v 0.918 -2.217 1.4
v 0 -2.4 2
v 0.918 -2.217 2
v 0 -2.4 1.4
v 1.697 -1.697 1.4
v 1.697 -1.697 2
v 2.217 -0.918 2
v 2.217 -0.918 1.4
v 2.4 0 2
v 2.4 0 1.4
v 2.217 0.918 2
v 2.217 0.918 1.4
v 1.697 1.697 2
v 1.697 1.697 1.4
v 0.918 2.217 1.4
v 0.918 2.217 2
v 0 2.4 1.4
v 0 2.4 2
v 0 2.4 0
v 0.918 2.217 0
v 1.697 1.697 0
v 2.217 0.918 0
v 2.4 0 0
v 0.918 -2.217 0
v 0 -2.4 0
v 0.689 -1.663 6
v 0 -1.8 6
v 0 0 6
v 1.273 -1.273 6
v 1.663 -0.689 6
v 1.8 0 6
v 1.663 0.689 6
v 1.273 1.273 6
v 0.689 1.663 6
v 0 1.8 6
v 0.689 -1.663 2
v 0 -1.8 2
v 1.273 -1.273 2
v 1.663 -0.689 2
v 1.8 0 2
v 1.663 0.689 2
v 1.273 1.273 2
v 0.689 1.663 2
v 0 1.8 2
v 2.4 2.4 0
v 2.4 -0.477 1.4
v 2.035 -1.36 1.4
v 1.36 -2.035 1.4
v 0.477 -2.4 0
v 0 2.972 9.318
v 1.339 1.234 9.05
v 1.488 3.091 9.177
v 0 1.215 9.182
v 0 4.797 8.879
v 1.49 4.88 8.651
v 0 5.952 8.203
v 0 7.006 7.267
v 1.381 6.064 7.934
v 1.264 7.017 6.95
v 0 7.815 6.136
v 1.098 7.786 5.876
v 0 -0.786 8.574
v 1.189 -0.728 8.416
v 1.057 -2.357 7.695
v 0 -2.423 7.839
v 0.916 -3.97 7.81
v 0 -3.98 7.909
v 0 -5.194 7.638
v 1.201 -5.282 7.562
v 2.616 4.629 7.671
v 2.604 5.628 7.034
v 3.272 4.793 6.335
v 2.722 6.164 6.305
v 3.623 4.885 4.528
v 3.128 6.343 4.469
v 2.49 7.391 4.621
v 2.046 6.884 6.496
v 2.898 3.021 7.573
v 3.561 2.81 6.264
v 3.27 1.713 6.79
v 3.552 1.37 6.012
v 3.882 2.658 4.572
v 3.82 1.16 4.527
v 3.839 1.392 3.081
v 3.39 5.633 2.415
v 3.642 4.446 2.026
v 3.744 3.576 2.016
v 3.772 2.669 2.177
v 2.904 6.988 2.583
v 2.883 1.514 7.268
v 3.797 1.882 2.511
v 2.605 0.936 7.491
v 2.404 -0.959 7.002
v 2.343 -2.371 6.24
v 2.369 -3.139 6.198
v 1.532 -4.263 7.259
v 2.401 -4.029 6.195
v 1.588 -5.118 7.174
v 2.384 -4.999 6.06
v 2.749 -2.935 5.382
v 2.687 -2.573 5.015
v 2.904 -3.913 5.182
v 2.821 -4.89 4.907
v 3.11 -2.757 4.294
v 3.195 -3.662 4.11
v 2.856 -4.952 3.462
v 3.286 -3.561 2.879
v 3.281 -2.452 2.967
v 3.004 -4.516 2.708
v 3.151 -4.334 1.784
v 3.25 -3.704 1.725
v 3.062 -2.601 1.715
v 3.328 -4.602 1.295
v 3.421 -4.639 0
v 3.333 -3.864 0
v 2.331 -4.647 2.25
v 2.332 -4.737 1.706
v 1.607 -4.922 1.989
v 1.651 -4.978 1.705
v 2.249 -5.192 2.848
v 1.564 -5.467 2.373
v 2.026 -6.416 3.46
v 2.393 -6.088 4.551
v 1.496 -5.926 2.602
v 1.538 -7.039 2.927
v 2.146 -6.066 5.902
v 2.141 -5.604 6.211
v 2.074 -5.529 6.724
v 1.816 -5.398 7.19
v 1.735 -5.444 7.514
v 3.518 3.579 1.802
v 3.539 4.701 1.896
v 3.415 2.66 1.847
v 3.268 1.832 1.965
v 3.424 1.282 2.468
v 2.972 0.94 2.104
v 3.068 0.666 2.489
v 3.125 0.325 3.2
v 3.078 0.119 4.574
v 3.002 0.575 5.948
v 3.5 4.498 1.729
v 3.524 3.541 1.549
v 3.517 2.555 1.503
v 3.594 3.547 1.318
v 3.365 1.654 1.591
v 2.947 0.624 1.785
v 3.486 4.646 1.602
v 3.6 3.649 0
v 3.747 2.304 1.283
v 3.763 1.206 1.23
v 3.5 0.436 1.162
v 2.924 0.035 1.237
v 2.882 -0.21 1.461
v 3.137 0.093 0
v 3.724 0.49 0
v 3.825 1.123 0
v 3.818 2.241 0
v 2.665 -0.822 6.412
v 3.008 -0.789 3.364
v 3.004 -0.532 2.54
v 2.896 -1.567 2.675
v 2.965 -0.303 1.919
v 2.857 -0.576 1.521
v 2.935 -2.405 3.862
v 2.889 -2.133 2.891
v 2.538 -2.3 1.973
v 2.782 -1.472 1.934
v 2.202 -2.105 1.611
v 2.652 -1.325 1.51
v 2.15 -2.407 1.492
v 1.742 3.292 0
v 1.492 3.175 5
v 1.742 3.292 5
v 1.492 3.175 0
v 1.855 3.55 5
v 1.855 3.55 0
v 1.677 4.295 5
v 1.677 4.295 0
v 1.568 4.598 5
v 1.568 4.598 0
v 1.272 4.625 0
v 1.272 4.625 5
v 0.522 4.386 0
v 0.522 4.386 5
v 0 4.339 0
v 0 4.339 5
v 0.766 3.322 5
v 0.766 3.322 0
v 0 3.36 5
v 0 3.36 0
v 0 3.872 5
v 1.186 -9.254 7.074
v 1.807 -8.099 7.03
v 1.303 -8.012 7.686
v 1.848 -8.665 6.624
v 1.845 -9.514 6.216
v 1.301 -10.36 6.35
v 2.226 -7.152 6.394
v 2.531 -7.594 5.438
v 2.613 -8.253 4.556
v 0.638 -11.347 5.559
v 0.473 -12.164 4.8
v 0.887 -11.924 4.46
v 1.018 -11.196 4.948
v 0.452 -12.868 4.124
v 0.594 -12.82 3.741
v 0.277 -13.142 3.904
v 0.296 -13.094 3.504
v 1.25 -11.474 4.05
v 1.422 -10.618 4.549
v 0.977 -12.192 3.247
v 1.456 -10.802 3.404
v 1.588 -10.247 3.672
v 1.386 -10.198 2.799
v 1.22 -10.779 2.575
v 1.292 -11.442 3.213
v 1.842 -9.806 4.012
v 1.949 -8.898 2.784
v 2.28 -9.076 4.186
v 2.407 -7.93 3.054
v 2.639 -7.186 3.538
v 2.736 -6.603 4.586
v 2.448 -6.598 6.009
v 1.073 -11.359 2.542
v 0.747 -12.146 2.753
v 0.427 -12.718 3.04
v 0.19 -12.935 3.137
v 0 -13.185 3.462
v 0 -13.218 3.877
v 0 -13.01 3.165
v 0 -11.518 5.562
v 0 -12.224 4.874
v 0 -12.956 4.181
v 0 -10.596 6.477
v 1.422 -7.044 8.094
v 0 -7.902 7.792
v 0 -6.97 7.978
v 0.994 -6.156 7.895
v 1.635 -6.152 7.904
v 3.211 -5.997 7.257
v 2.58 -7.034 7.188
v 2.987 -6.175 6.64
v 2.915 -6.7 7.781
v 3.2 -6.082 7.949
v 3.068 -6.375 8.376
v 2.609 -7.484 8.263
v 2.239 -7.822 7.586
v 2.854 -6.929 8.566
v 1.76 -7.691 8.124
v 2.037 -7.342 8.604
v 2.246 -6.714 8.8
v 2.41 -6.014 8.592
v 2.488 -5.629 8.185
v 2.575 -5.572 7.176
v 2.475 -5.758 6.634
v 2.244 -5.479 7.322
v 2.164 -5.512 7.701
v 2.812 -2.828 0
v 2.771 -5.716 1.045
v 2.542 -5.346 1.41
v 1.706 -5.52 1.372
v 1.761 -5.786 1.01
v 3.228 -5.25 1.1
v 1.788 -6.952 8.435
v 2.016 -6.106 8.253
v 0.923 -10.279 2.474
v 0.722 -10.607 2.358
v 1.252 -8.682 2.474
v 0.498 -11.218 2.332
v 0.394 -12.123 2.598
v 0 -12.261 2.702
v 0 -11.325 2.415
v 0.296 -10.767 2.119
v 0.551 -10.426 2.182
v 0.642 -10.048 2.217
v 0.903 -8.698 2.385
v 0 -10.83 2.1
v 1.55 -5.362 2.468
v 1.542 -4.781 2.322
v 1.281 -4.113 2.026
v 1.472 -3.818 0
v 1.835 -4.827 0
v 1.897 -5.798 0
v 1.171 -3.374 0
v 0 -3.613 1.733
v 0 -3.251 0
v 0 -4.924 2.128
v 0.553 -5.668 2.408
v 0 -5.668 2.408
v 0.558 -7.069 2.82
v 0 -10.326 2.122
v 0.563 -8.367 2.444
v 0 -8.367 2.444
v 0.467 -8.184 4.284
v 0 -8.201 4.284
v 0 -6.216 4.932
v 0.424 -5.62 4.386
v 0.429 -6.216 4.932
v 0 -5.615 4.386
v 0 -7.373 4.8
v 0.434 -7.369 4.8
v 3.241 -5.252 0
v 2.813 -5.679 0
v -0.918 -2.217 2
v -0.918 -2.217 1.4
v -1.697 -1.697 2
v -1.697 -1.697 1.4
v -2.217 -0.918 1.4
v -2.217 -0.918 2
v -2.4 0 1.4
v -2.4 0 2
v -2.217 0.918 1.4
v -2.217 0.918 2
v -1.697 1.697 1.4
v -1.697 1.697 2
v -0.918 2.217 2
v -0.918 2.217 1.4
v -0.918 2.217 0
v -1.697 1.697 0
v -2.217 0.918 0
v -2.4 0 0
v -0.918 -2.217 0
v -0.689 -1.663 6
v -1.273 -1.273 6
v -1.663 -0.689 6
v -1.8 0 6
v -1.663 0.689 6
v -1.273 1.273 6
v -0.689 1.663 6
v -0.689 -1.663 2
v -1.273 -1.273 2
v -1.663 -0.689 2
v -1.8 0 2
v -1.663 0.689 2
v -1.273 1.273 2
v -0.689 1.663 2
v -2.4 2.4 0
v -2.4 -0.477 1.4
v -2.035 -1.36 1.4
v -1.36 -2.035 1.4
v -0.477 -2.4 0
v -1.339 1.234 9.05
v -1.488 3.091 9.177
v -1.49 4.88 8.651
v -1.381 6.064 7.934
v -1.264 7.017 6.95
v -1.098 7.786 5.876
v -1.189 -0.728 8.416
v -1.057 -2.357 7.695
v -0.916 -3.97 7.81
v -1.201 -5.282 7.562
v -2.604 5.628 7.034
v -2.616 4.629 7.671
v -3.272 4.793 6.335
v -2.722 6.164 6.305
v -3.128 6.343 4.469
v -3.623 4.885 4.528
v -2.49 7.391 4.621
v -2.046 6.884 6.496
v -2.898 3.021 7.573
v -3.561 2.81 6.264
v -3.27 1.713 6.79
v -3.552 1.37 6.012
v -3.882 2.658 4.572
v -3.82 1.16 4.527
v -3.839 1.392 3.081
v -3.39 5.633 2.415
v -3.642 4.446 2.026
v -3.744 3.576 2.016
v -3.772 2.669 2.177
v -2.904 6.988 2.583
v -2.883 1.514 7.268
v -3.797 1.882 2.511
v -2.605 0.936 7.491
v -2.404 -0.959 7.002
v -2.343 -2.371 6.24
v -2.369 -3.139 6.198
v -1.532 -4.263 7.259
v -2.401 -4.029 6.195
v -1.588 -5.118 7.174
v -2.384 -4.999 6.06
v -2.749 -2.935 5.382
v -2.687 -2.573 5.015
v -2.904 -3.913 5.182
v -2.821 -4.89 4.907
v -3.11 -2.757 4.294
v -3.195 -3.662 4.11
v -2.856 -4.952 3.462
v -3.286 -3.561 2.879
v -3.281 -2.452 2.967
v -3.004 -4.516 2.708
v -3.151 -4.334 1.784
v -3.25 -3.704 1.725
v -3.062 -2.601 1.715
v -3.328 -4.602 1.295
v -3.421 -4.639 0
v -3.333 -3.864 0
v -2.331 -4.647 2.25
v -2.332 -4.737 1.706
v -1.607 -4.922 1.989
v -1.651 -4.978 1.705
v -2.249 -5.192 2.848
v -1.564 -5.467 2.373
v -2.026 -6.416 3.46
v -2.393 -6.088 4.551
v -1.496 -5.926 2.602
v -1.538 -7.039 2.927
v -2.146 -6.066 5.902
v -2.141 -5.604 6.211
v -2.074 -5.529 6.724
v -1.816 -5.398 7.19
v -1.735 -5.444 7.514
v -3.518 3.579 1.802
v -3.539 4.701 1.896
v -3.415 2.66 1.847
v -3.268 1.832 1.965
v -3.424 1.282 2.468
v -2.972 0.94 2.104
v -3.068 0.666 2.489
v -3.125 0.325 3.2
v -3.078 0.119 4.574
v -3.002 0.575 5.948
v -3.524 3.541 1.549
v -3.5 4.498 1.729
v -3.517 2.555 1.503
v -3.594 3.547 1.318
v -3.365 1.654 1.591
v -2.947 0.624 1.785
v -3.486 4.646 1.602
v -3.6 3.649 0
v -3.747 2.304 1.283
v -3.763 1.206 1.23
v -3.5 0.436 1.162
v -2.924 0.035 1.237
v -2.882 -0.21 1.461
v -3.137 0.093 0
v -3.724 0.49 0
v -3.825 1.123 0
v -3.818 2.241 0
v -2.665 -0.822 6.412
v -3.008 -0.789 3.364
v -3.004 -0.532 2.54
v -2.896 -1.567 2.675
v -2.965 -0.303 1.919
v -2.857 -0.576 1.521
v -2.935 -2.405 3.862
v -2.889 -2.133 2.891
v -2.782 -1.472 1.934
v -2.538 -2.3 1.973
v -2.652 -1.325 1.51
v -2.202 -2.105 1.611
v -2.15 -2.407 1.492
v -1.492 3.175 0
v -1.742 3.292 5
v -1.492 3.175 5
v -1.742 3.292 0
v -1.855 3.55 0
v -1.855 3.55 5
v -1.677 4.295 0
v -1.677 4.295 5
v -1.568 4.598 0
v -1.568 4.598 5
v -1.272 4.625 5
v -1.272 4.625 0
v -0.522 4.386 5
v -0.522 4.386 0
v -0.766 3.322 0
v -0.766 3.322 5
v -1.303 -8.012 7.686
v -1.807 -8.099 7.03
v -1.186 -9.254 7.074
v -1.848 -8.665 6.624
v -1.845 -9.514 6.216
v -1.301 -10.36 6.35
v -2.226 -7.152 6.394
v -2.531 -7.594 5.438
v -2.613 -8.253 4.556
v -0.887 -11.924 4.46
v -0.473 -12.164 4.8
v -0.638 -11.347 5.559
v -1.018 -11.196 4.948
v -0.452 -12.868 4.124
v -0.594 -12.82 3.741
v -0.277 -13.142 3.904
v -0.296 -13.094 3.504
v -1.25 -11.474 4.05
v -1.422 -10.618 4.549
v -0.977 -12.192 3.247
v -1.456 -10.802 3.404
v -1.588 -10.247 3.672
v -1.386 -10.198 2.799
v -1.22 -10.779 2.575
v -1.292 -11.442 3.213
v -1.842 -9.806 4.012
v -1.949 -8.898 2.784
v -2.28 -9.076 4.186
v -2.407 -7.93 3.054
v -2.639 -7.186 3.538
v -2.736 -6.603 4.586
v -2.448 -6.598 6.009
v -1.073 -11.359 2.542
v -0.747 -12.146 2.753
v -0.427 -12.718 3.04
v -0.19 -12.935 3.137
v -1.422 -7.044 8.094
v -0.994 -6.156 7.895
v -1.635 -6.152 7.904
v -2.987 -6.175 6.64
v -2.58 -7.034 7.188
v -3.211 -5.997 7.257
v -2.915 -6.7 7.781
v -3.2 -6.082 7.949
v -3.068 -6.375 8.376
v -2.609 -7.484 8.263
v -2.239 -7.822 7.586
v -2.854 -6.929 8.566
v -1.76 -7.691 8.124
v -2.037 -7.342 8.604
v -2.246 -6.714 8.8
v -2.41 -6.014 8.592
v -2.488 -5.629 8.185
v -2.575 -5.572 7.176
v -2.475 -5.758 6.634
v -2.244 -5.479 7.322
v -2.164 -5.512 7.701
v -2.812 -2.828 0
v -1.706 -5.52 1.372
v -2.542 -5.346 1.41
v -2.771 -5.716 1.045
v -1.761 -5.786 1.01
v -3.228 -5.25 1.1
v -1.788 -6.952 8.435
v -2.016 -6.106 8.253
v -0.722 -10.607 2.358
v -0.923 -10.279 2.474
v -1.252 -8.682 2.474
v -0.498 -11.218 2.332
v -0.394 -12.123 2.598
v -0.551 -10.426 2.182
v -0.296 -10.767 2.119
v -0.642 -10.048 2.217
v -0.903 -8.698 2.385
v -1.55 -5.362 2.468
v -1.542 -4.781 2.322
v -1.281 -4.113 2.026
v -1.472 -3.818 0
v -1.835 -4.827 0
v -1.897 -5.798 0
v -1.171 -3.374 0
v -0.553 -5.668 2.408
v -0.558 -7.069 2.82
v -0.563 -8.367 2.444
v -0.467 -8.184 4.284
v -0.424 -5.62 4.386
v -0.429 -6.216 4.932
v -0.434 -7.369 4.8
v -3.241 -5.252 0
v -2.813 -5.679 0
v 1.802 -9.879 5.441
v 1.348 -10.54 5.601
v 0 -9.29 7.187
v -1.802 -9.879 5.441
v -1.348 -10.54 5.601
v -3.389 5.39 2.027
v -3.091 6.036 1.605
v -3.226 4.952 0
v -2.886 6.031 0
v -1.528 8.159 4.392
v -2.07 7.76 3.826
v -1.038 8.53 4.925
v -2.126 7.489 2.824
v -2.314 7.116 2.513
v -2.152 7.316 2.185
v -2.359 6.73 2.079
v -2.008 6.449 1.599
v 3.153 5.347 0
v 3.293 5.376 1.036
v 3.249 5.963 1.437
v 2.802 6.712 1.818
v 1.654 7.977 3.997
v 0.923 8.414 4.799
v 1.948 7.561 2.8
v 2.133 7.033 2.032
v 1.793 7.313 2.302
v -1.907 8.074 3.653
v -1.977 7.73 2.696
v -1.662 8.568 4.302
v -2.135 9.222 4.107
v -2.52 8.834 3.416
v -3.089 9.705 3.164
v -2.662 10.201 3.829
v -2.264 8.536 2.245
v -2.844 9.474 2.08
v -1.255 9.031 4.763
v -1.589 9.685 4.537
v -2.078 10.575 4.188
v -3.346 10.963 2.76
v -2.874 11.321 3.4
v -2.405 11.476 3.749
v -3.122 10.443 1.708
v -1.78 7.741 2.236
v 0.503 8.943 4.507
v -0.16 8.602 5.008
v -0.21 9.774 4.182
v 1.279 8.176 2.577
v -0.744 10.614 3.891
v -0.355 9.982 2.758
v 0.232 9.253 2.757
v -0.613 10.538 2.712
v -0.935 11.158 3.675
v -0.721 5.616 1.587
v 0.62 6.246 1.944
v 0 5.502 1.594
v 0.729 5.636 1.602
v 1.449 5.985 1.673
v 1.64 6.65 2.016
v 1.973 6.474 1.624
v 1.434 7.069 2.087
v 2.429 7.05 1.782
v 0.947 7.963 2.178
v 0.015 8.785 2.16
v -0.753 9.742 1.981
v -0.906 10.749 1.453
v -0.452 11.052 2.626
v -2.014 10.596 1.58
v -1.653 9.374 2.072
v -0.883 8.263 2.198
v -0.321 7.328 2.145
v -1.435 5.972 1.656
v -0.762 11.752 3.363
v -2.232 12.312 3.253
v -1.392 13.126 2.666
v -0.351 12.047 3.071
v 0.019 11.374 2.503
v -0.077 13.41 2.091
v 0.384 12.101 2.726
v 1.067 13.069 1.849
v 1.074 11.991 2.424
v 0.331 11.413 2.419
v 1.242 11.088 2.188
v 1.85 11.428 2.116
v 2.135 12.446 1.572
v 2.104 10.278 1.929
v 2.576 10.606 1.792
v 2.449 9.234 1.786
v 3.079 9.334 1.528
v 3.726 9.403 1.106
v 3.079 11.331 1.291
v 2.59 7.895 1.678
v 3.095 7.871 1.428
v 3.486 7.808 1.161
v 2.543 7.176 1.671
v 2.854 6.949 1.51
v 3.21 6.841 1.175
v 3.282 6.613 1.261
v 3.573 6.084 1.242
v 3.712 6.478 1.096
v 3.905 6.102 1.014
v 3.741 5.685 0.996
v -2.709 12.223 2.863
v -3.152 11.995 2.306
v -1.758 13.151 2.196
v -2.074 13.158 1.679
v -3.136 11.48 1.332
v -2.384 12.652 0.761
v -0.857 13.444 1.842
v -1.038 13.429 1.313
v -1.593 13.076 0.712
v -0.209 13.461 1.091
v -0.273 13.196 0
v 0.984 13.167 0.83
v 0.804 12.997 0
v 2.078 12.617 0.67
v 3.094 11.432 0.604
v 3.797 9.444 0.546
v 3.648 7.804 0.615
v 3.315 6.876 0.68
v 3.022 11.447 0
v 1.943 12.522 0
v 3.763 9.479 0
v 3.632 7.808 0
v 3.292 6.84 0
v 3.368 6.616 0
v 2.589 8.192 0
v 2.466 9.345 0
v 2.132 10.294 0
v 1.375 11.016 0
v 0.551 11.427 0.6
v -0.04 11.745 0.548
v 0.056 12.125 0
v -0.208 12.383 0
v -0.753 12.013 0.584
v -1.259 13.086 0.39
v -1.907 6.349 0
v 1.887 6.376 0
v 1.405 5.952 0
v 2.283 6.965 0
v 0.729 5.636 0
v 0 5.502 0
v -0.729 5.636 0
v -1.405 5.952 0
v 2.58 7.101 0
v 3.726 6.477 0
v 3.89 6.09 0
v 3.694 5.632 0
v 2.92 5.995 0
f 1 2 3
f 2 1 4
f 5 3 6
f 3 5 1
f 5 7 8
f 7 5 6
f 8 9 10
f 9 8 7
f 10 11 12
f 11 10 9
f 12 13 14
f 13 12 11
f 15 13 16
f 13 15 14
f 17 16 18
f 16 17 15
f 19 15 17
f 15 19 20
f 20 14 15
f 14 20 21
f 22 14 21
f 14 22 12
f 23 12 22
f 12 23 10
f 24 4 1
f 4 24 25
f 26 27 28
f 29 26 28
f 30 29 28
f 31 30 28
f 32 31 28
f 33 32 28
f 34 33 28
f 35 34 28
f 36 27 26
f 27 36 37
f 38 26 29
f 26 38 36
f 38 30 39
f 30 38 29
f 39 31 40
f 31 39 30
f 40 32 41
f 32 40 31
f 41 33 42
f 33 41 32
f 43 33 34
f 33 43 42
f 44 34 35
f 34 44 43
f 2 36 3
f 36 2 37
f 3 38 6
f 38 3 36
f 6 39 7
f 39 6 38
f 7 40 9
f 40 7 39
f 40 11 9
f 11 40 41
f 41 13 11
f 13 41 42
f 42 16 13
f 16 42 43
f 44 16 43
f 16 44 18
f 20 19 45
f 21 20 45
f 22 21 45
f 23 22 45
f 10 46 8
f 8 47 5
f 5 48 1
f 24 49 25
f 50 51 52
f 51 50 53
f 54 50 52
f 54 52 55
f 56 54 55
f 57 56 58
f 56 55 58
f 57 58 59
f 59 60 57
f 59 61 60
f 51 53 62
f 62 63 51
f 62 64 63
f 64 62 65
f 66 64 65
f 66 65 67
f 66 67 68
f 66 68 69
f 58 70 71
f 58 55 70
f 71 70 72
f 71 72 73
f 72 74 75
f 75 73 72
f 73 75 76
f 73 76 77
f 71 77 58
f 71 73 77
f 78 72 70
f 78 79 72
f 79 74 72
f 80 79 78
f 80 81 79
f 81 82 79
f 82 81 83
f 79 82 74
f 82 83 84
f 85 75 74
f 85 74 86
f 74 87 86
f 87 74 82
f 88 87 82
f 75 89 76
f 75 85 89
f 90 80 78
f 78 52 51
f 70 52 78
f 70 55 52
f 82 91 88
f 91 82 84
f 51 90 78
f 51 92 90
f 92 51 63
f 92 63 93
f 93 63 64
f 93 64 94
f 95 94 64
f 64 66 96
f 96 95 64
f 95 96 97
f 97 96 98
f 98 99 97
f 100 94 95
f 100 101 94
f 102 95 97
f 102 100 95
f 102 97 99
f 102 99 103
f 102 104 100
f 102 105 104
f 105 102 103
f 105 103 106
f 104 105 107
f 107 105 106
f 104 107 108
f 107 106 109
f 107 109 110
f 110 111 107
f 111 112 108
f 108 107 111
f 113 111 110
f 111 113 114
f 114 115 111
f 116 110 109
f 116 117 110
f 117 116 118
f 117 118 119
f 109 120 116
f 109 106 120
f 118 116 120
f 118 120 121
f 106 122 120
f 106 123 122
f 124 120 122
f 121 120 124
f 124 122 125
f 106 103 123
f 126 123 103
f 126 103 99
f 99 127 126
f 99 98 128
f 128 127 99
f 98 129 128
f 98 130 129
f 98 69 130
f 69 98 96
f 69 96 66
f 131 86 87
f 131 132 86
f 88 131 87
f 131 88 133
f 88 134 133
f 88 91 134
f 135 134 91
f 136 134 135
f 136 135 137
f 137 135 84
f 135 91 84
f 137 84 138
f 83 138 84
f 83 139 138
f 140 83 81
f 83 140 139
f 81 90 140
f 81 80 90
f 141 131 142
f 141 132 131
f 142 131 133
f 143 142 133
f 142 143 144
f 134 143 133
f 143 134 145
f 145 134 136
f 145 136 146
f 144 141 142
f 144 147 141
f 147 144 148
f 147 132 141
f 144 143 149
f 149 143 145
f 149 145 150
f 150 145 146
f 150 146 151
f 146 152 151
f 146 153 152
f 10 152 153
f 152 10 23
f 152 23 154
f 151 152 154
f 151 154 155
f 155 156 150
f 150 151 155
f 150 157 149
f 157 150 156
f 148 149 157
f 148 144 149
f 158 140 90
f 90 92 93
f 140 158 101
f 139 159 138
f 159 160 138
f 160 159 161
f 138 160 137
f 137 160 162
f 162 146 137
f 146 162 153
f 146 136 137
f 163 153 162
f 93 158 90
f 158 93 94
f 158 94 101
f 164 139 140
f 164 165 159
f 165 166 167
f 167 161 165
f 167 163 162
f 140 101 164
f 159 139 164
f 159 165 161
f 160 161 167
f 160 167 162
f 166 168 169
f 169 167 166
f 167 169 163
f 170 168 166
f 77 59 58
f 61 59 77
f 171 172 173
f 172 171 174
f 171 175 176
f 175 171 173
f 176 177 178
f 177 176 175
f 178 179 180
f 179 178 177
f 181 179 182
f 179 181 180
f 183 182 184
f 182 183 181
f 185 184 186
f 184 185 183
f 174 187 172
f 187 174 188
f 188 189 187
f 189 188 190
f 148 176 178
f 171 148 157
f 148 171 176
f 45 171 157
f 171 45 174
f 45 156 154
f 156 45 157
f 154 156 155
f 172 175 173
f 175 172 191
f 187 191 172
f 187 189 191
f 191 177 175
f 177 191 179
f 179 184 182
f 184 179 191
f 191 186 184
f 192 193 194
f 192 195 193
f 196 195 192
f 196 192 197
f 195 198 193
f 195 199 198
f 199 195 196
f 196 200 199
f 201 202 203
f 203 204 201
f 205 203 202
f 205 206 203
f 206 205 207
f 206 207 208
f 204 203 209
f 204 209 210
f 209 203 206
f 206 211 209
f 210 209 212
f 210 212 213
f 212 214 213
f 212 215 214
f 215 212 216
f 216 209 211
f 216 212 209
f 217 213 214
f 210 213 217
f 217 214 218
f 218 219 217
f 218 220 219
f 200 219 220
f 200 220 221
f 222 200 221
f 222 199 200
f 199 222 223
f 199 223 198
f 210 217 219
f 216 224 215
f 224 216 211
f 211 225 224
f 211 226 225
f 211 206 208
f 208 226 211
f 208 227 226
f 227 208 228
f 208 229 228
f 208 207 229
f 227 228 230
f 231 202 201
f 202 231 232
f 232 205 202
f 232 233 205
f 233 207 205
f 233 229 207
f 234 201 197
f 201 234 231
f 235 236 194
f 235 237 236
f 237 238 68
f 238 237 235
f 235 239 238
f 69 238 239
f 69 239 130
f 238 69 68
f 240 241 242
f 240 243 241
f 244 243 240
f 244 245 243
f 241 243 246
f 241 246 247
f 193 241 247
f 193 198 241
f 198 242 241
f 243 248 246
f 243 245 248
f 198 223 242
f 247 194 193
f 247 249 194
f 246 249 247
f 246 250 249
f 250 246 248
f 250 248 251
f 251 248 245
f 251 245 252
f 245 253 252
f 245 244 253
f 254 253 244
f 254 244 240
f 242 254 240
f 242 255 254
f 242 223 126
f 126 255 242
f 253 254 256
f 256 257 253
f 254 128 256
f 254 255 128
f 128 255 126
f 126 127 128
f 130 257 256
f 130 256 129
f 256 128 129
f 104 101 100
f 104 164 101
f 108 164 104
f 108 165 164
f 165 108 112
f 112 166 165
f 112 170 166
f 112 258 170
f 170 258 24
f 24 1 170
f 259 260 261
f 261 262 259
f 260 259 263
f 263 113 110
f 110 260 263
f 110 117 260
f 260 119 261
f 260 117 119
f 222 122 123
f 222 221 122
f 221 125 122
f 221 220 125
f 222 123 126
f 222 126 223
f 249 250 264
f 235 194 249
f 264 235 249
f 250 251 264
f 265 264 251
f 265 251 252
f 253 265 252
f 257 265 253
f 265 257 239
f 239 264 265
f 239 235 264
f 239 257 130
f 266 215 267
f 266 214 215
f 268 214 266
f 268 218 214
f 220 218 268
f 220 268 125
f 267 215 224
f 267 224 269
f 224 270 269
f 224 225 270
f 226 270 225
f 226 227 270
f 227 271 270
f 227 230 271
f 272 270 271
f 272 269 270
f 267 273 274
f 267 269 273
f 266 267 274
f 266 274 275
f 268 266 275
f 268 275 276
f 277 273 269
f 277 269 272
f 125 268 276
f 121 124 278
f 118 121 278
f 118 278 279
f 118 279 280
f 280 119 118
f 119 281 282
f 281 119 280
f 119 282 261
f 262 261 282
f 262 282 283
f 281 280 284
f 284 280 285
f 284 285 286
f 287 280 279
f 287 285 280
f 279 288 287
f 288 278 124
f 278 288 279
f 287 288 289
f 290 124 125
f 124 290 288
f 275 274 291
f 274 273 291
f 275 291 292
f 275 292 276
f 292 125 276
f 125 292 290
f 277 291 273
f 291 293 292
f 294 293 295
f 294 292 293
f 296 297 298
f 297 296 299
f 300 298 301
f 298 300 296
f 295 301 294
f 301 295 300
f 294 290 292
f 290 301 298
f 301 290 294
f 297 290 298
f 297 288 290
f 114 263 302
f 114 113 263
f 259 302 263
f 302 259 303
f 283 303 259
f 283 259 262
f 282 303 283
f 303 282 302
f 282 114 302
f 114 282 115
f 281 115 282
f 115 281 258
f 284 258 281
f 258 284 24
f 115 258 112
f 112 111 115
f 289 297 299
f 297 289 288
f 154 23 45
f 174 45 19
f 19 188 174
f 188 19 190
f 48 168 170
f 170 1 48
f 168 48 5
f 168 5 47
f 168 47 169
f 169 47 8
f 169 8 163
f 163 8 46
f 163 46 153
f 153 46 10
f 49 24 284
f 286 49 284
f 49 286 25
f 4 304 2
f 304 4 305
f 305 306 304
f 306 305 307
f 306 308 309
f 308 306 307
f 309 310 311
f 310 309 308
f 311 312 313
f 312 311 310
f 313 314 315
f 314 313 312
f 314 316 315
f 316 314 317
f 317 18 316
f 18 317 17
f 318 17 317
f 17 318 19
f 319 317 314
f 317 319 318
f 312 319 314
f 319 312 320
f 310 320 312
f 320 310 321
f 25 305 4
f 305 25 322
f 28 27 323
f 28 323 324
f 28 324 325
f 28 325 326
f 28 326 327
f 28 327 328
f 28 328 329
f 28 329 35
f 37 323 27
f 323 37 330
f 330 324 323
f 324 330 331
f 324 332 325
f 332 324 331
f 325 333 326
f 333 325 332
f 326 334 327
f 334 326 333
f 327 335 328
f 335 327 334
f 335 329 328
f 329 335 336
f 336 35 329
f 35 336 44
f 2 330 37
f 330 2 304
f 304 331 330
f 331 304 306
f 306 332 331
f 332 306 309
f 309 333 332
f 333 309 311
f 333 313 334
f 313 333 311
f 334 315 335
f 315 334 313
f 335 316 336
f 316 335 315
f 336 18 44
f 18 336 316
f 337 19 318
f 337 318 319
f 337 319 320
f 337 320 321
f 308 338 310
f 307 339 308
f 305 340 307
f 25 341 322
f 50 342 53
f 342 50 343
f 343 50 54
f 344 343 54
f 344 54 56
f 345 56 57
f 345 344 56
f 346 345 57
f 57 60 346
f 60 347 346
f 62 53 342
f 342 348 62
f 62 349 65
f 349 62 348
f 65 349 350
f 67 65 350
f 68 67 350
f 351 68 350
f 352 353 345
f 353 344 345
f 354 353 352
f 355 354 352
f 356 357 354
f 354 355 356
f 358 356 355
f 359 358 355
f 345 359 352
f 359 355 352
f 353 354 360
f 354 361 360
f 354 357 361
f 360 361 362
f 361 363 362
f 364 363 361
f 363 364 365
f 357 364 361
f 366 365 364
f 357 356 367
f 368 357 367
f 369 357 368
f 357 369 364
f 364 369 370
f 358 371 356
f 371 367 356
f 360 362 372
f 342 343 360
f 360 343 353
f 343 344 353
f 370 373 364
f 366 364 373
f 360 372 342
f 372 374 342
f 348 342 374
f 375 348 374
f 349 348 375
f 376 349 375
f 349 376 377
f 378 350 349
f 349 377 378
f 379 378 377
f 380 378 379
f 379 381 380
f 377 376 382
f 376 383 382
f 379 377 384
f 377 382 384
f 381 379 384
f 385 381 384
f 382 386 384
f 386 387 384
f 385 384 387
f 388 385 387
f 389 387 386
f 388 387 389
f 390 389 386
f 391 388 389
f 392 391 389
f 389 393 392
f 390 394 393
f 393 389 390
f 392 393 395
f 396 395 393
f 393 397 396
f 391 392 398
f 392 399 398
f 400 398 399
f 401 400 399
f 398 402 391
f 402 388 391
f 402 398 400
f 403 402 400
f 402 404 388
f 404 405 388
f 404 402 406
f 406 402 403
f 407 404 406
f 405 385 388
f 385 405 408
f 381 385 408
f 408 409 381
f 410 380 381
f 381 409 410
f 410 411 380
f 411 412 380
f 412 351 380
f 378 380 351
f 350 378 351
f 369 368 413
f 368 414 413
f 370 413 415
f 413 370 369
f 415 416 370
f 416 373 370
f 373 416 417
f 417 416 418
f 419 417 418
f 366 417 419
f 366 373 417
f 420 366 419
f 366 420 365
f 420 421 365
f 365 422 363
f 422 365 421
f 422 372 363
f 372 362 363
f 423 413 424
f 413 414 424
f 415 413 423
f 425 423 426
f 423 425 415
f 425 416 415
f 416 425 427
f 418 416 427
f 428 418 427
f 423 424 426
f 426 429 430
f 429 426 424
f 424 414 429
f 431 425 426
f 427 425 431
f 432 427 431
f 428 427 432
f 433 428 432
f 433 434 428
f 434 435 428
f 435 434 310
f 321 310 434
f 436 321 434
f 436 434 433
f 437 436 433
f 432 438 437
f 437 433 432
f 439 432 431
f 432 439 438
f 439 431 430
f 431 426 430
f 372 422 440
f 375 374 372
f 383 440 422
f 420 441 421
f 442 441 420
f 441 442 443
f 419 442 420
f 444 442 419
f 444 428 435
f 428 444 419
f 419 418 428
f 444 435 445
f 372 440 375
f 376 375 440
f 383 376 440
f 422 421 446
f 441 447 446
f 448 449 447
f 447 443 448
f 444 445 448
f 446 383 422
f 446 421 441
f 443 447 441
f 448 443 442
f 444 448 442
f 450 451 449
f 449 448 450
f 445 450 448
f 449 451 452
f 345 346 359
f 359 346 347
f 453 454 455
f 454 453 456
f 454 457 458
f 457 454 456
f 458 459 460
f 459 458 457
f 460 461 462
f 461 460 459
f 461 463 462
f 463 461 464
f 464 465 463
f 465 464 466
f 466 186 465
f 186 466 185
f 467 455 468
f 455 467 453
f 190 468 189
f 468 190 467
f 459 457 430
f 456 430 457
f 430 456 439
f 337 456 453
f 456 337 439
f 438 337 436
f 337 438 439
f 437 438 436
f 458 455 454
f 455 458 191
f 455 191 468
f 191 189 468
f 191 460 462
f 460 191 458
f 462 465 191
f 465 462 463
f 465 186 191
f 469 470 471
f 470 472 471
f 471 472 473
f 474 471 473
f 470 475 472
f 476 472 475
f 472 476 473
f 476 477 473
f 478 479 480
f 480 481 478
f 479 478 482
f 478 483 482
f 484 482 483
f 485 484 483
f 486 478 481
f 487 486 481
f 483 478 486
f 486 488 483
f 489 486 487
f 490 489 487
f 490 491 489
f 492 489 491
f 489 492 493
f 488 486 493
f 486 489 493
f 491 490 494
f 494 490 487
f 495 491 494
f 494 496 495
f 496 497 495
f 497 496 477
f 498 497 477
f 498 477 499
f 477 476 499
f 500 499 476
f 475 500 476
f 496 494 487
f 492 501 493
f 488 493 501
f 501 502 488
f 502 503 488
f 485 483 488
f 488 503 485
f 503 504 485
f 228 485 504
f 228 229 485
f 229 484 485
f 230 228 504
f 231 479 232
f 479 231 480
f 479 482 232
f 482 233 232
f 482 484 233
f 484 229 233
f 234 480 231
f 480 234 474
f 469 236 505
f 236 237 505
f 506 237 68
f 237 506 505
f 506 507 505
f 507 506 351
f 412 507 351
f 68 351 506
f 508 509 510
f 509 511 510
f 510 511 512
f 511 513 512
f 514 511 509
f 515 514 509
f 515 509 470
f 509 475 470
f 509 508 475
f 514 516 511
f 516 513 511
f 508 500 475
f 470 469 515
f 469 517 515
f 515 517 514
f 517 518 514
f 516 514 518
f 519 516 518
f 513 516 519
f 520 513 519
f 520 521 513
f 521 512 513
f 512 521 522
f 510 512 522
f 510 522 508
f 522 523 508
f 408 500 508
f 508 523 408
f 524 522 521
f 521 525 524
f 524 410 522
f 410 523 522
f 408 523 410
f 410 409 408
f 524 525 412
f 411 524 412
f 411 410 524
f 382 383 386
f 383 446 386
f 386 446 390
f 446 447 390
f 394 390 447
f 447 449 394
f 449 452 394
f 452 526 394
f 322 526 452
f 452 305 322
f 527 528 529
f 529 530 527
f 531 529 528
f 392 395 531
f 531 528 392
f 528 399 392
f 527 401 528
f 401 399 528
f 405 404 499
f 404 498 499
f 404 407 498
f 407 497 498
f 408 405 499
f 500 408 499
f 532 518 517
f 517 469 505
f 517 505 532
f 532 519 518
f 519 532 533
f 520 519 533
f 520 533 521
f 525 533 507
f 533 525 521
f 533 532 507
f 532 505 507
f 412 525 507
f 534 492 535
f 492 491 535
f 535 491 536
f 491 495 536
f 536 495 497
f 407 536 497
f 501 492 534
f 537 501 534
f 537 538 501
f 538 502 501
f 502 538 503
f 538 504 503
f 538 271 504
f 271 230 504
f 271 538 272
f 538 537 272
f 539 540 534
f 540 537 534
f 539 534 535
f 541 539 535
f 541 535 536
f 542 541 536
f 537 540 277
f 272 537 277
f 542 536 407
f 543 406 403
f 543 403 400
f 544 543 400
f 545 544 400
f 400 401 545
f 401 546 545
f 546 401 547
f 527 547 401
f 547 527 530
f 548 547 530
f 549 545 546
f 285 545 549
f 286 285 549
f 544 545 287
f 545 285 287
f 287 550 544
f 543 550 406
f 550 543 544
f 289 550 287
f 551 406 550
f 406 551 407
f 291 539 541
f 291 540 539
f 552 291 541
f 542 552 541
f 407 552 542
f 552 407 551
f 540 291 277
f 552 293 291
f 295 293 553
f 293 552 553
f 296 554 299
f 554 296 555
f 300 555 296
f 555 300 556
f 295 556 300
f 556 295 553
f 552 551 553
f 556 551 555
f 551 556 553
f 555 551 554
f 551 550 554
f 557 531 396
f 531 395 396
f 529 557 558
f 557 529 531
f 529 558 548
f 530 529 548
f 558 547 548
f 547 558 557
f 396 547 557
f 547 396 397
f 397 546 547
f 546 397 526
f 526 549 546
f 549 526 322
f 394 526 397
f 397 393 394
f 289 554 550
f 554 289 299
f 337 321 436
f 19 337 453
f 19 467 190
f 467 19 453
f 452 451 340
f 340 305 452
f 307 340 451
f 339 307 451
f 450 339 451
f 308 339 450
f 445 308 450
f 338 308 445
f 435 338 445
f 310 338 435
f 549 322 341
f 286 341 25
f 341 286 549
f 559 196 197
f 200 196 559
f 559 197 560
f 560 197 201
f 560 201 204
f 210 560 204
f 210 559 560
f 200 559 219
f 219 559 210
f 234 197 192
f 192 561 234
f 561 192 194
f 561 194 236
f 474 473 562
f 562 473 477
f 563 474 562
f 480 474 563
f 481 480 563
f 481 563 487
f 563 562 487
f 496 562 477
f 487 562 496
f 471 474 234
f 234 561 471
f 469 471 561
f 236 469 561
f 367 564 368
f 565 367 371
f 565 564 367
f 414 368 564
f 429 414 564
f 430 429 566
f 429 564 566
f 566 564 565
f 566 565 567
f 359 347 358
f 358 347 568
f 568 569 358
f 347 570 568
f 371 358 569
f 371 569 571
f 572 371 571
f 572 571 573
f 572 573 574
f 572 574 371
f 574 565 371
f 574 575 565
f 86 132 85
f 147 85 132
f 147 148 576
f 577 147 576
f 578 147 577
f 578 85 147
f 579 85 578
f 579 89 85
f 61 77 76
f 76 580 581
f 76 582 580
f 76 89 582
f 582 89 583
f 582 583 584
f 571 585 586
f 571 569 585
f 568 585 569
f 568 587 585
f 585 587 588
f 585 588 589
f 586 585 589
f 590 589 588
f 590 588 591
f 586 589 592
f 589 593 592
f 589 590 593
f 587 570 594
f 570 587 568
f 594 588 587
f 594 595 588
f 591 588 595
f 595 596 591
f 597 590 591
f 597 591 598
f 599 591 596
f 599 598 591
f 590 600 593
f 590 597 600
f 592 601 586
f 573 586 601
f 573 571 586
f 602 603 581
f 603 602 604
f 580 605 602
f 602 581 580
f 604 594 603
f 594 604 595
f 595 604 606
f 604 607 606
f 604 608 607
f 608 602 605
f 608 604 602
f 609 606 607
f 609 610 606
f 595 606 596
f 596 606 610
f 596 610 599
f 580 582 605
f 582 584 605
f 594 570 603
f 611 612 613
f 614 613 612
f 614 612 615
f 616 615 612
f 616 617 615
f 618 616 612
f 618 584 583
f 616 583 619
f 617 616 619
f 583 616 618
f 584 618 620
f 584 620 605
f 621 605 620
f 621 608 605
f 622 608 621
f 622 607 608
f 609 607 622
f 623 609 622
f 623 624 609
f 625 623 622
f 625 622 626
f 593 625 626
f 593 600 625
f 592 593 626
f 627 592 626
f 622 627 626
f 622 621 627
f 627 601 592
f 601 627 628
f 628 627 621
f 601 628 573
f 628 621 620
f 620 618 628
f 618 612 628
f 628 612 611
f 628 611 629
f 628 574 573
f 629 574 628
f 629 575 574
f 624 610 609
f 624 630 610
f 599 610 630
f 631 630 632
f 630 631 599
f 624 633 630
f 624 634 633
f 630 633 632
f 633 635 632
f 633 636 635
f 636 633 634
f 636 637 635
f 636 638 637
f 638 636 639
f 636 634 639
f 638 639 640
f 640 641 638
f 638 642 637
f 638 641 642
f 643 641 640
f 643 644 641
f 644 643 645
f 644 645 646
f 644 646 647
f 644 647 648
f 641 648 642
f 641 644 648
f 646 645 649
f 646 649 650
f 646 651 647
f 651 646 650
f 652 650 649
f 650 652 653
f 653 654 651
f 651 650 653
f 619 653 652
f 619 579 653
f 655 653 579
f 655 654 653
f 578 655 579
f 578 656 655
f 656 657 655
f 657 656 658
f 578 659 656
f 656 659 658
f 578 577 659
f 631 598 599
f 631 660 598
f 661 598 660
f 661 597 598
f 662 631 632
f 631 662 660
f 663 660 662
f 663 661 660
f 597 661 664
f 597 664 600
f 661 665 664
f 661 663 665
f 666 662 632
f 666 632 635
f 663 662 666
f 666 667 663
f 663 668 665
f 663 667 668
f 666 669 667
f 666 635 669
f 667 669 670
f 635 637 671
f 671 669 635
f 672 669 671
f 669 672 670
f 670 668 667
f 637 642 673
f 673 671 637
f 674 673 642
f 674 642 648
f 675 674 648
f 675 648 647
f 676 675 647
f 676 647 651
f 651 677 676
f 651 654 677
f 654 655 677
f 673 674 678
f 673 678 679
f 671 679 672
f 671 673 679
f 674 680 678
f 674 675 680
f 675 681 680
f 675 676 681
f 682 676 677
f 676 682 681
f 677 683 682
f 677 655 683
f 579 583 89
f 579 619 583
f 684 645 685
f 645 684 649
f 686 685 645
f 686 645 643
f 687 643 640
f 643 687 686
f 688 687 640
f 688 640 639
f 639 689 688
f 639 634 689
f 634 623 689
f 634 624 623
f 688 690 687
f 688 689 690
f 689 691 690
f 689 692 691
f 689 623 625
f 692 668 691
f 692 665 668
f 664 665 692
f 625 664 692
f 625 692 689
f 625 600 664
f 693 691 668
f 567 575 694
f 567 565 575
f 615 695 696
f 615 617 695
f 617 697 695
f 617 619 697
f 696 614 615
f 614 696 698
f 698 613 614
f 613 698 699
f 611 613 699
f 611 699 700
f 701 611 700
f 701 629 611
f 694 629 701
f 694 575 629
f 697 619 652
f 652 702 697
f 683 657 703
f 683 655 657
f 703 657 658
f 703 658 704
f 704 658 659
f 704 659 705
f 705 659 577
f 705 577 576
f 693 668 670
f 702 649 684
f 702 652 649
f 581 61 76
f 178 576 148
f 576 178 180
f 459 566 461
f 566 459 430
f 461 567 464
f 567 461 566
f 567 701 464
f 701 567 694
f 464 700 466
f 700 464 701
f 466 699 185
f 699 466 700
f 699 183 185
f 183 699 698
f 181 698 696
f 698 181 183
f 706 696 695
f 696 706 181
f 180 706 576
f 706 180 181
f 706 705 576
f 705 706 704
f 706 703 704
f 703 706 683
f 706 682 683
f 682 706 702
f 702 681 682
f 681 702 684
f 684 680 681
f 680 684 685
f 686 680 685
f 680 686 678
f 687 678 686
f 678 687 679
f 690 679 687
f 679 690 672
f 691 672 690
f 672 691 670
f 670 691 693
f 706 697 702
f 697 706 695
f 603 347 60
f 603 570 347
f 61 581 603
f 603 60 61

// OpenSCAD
use <../lib.scad>
use <s/36756s01.scad>
use <s/36756s02.scad>
use <s/36756s03.scad>
use <s/36756s04.scad>
function ldraw_lib__36756() = [
// 0 Animal Rat with Bent Tail
// 0 Name: 36756.dat
// 0 Author: Philippe Hurbain [Philo]
// 0 !LDRAW_ORG Part UPDATE 2024-08
// 0 !LICENSE Licensed under CC BY 4.0 : see CAreadme.txt
// 
// 0 BFC CERTIFY CCW
  [0,"BFC","CERTIFY"],
  [0,"BFC","CCW"],
// 
// 0 !KEYWORDS Rodent
// 
// 0 !HISTORY 2022-01-13 {LEGO Instructions App} Original part shape
// 0 !HISTORY 2022-01-13 [Philo] File preparation for LDraw Parts Tracker
// 0 !HISTORY 2024-09-30 [OrionP] Official Update 2024-08
// 
// 
// 1 16 0 0 0 1 0 0 0 1 0 0 0 1 s\36756s01.dat
  [1,16,0,0,0,1,0,0,0,1,0,0,0,1, ldraw_lib__s__36756s01()],
// 1 16 0 0 0 -1 0 0 0 1 0 0 0 1 s\36756s01.dat
  [1,16,0,0,0,-1,0,0,0,1,0,0,0,1, ldraw_lib__s__36756s01()],
// 1 16 0 0 0 1 0 0 0 1 0 0 0 1 s\36756s04.dat
  [1,16,0,0,0,1,0,0,0,1,0,0,0,1, ldraw_lib__s__36756s04()],
// 1 16 0 0 0 1 0 0 0 1 0 0 0 1 s\36756s03.dat
  [1,16,0,0,0,1,0,0,0,1,0,0,0,1, ldraw_lib__s__36756s03()],
// 1 16 0 0 0 -1 0 0 0 1 0 0 0 1 s\36756s04.dat
  [1,16,0,0,0,-1,0,0,0,1,0,0,0,1, ldraw_lib__s__36756s04()],
// 1 16 0 0 0 -1 0 0 0 1 0 0 0 1 s\36756s03.dat
  [1,16,0,0,0,-1,0,0,0,1,0,0,0,1, ldraw_lib__s__36756s03()],
// 1 16 0 0 0 1 0 0 0 1 0 0 0 1 s\36756s02.dat
  [1,16,0,0,0,1,0,0,0,1,0,0,0,1, ldraw_lib__s__36756s02()],
];
module ldraw_lib__36756(step=0, col=false, unit=2/5, alt=false, line=0.2, solid=!$preview)
    makepoly(ldraw_lib__36756(), step=step, col=col, unit=unit, alt=alt, line=line, solid=solid);
ldraw_lib__36756(line=0.2);
